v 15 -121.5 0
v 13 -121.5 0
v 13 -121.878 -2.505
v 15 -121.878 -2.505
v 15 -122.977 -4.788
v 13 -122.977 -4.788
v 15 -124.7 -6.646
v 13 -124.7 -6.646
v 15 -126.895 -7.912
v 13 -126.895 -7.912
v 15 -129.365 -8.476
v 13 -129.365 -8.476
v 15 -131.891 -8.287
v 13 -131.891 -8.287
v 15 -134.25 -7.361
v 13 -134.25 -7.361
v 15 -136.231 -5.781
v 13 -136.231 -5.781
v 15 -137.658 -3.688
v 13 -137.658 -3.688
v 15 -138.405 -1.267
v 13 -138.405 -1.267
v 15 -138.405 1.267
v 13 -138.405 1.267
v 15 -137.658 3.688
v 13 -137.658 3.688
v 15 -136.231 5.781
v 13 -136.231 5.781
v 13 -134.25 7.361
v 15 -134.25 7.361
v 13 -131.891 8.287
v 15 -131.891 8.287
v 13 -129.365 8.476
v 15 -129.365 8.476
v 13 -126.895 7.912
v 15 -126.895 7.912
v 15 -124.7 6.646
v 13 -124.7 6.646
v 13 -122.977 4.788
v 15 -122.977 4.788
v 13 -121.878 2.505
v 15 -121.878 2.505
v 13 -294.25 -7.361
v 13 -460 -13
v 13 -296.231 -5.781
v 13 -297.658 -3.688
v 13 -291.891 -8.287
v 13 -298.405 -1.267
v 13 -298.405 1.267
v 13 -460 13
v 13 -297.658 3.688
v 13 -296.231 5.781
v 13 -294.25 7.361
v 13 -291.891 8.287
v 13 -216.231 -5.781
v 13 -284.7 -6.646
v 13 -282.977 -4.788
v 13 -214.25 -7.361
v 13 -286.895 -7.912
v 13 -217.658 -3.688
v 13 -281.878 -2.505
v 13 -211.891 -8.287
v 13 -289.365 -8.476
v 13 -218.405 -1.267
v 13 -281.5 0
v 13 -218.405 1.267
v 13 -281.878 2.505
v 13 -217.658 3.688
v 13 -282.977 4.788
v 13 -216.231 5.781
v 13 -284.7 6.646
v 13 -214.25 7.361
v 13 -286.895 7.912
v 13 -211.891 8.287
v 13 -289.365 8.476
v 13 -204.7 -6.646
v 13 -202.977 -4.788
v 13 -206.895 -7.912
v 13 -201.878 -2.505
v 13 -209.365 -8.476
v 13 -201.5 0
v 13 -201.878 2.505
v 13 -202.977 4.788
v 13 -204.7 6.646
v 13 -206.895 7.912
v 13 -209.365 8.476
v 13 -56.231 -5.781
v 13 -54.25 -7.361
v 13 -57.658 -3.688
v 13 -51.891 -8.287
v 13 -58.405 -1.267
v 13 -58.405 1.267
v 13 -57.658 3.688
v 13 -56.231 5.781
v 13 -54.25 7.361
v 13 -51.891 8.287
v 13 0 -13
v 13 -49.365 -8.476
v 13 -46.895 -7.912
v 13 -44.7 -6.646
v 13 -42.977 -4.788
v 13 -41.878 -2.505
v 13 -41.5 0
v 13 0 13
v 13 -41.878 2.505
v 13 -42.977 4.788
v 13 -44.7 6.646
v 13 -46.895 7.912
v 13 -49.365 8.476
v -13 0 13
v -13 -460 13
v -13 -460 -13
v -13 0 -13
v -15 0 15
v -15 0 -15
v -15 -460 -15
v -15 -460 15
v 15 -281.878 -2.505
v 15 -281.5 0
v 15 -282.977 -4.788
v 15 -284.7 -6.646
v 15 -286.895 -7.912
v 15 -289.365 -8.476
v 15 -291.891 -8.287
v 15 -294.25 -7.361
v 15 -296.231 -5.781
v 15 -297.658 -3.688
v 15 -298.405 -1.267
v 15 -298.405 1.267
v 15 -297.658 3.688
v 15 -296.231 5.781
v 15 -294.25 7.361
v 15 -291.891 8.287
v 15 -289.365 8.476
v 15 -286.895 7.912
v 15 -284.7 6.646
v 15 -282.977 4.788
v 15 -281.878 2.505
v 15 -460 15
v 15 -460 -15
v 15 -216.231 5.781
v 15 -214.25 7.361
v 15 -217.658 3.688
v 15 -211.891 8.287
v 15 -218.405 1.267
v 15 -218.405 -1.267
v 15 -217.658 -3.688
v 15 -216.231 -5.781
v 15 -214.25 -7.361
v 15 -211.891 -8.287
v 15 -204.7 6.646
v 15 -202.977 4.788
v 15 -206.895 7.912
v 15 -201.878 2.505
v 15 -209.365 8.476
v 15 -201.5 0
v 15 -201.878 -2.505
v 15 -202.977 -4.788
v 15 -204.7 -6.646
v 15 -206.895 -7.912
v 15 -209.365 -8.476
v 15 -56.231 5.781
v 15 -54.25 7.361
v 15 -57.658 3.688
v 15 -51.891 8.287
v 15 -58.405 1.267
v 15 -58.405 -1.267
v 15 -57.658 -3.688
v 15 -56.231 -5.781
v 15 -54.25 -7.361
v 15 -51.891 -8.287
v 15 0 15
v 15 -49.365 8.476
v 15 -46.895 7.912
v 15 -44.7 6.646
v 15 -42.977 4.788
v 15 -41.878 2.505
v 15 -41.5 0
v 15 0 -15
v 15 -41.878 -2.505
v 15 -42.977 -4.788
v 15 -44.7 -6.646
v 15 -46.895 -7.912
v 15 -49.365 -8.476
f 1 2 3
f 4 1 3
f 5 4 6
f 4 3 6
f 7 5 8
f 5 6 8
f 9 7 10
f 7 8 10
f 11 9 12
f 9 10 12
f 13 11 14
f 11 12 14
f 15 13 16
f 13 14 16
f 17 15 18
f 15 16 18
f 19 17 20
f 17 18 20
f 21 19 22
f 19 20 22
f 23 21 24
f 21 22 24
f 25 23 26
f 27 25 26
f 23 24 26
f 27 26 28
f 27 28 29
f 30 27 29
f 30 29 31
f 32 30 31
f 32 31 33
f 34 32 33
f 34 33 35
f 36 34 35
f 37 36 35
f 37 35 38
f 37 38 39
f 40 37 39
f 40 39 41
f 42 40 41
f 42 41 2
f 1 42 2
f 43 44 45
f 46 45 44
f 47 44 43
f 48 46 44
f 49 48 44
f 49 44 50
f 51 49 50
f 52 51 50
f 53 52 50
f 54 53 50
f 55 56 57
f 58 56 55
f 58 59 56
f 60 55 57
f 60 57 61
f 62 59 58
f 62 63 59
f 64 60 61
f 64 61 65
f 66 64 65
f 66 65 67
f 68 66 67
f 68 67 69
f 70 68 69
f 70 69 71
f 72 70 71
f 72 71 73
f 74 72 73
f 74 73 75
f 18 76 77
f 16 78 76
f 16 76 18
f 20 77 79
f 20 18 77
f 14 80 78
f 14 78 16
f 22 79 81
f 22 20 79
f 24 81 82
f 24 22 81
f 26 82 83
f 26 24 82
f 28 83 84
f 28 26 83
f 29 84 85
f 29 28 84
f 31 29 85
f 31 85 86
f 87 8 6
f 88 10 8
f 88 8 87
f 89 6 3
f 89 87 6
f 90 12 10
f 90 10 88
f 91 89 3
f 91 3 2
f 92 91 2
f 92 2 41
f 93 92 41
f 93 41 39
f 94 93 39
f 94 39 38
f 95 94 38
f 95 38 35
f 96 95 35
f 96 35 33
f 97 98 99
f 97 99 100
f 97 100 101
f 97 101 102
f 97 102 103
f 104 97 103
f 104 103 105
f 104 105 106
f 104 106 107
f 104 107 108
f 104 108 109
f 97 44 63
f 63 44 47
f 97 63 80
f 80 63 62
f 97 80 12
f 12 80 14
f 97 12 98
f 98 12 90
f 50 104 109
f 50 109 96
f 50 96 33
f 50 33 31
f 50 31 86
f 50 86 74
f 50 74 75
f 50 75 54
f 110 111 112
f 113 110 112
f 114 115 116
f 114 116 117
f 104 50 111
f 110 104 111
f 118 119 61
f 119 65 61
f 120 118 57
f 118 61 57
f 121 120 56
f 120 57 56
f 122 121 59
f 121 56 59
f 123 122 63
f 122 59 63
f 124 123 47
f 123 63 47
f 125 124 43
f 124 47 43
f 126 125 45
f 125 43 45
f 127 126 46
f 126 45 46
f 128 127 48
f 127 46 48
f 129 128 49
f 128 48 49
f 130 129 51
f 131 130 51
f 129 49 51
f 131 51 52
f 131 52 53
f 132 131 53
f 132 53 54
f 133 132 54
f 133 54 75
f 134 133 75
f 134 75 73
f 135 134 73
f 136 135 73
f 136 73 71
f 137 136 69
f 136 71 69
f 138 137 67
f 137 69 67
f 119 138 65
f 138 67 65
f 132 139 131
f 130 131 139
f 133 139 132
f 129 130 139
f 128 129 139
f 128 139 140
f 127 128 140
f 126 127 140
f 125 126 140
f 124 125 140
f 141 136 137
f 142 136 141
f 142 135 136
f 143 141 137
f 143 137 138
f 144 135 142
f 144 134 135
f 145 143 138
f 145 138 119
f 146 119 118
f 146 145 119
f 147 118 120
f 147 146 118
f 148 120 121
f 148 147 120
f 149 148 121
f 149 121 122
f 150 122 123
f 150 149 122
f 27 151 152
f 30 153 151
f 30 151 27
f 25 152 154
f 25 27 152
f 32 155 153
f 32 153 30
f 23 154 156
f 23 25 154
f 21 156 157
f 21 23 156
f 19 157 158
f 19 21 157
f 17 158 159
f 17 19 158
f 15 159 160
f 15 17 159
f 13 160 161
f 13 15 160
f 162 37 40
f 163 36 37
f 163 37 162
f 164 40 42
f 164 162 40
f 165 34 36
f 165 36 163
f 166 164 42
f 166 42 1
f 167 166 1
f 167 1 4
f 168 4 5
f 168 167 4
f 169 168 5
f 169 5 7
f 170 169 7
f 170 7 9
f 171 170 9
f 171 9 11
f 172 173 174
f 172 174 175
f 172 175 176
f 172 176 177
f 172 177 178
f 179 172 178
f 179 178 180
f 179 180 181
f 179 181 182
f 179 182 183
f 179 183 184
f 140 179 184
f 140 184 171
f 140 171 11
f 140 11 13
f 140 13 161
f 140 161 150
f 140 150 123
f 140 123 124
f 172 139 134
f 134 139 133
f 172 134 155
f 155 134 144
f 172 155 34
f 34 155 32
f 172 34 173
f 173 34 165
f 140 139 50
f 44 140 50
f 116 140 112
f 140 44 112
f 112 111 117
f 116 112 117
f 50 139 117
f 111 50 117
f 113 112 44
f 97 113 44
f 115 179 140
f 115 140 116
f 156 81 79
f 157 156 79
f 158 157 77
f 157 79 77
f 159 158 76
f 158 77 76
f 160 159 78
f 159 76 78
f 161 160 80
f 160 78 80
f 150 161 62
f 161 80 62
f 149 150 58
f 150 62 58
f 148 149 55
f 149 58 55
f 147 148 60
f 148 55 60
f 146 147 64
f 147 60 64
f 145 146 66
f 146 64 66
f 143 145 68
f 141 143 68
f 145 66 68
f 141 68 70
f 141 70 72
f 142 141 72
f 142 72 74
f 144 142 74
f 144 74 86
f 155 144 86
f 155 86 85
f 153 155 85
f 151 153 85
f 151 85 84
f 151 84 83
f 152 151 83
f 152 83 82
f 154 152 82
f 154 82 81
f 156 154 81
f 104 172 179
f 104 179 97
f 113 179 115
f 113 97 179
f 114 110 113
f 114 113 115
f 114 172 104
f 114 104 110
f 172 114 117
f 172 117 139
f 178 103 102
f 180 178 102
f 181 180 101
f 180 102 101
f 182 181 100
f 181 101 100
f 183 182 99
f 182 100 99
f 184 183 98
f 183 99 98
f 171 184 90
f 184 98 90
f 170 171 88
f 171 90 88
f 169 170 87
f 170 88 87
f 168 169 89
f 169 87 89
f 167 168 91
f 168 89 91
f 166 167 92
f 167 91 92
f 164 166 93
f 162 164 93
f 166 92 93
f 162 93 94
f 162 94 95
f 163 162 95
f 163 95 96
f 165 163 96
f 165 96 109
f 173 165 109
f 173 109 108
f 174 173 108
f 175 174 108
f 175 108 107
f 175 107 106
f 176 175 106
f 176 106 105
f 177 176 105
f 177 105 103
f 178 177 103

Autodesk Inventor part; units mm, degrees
ref_plane "YZ Plane" through (0, 0, 0) normal (1, 0, 0) x (0, 1, 0)
ref_plane "XZ Plane" through (0, 0, 0) normal (0, 1, 0) x (-1, 0, 0)
ref_plane "XY Plane" through (0, 0, 0) normal (0, 0, 1) x (1, 0, 0)
sketch "Sketch9" plane through (0, 0, 0) normal (0, 1, 0) x (-1, 0, 0)
  line L0 (15, 15) -> (-15, 15)
  line L1 (-15, 15) -> (-15, -15)
  line L2 (-15, -15) -> (15, -15)
  line L3 (15, -15) -> (15, 15)
  line L4 (15, 15) -> (-15, -15) construction
  line L5 (-15, 15) -> (15, -15) construction
  line L6 (-13, 13) -> (13, 13)
  line L7 (13, 13) -> (13, -13)
  line L8 (13, -13) -> (-13, -13)
  line L9 (-13, -13) -> (-13, 13)
  point P0 (0, 0)
  dimension "d172" = 30
  dimension "d173" = 30
  dimension "d174" = 2
extrude "Extrusion3" add sketch "Sketch9" against normal blind 460
sketch "Sketch10" plane through (0, 0, 0) normal (1, 0, 0) x (0, 1, 0)
  line L0 (0, 15) -> (0, -15) construction
  line L1 (0, 15) -> (-460, 15) construction
  line L2 (0, -15) -> (-460, -15) construction
  line L3 (-58.5, 8.5) -> (-41.5, 8.5)
  line L4 (-41.5, 8.5) -> (-41.5, -8.5)
  line L5 (-41.5, -8.5) -> (-58.5, -8.5)
  line L6 (-58.5, -8.5) -> (-58.5, 8.5)
  line L7 (-58.5, 8.5) -> (-41.5, -8.5) construction
  line L8 (-41.5, 8.5) -> (-58.5, -8.5) construction
  line L9 (0, 0) -> (30, 0)
  circle A0 centre (-50, 0) radius 8.5
  dimension "d177" = 17
  dimension "d178" = 17
  dimension "d181" = 30
  dimension "d182" = 80
extrude "Extrusion4" cut sketch "Sketch10" along normal through all contours A0
pattern_linear "Rectangular Pattern4" count 4 spacing 80 along (0, -1, 0) of "Extrusion4"
properties part number "PRS 1662 DrSysB way tube 2_1200" material "Stainless Steel"
